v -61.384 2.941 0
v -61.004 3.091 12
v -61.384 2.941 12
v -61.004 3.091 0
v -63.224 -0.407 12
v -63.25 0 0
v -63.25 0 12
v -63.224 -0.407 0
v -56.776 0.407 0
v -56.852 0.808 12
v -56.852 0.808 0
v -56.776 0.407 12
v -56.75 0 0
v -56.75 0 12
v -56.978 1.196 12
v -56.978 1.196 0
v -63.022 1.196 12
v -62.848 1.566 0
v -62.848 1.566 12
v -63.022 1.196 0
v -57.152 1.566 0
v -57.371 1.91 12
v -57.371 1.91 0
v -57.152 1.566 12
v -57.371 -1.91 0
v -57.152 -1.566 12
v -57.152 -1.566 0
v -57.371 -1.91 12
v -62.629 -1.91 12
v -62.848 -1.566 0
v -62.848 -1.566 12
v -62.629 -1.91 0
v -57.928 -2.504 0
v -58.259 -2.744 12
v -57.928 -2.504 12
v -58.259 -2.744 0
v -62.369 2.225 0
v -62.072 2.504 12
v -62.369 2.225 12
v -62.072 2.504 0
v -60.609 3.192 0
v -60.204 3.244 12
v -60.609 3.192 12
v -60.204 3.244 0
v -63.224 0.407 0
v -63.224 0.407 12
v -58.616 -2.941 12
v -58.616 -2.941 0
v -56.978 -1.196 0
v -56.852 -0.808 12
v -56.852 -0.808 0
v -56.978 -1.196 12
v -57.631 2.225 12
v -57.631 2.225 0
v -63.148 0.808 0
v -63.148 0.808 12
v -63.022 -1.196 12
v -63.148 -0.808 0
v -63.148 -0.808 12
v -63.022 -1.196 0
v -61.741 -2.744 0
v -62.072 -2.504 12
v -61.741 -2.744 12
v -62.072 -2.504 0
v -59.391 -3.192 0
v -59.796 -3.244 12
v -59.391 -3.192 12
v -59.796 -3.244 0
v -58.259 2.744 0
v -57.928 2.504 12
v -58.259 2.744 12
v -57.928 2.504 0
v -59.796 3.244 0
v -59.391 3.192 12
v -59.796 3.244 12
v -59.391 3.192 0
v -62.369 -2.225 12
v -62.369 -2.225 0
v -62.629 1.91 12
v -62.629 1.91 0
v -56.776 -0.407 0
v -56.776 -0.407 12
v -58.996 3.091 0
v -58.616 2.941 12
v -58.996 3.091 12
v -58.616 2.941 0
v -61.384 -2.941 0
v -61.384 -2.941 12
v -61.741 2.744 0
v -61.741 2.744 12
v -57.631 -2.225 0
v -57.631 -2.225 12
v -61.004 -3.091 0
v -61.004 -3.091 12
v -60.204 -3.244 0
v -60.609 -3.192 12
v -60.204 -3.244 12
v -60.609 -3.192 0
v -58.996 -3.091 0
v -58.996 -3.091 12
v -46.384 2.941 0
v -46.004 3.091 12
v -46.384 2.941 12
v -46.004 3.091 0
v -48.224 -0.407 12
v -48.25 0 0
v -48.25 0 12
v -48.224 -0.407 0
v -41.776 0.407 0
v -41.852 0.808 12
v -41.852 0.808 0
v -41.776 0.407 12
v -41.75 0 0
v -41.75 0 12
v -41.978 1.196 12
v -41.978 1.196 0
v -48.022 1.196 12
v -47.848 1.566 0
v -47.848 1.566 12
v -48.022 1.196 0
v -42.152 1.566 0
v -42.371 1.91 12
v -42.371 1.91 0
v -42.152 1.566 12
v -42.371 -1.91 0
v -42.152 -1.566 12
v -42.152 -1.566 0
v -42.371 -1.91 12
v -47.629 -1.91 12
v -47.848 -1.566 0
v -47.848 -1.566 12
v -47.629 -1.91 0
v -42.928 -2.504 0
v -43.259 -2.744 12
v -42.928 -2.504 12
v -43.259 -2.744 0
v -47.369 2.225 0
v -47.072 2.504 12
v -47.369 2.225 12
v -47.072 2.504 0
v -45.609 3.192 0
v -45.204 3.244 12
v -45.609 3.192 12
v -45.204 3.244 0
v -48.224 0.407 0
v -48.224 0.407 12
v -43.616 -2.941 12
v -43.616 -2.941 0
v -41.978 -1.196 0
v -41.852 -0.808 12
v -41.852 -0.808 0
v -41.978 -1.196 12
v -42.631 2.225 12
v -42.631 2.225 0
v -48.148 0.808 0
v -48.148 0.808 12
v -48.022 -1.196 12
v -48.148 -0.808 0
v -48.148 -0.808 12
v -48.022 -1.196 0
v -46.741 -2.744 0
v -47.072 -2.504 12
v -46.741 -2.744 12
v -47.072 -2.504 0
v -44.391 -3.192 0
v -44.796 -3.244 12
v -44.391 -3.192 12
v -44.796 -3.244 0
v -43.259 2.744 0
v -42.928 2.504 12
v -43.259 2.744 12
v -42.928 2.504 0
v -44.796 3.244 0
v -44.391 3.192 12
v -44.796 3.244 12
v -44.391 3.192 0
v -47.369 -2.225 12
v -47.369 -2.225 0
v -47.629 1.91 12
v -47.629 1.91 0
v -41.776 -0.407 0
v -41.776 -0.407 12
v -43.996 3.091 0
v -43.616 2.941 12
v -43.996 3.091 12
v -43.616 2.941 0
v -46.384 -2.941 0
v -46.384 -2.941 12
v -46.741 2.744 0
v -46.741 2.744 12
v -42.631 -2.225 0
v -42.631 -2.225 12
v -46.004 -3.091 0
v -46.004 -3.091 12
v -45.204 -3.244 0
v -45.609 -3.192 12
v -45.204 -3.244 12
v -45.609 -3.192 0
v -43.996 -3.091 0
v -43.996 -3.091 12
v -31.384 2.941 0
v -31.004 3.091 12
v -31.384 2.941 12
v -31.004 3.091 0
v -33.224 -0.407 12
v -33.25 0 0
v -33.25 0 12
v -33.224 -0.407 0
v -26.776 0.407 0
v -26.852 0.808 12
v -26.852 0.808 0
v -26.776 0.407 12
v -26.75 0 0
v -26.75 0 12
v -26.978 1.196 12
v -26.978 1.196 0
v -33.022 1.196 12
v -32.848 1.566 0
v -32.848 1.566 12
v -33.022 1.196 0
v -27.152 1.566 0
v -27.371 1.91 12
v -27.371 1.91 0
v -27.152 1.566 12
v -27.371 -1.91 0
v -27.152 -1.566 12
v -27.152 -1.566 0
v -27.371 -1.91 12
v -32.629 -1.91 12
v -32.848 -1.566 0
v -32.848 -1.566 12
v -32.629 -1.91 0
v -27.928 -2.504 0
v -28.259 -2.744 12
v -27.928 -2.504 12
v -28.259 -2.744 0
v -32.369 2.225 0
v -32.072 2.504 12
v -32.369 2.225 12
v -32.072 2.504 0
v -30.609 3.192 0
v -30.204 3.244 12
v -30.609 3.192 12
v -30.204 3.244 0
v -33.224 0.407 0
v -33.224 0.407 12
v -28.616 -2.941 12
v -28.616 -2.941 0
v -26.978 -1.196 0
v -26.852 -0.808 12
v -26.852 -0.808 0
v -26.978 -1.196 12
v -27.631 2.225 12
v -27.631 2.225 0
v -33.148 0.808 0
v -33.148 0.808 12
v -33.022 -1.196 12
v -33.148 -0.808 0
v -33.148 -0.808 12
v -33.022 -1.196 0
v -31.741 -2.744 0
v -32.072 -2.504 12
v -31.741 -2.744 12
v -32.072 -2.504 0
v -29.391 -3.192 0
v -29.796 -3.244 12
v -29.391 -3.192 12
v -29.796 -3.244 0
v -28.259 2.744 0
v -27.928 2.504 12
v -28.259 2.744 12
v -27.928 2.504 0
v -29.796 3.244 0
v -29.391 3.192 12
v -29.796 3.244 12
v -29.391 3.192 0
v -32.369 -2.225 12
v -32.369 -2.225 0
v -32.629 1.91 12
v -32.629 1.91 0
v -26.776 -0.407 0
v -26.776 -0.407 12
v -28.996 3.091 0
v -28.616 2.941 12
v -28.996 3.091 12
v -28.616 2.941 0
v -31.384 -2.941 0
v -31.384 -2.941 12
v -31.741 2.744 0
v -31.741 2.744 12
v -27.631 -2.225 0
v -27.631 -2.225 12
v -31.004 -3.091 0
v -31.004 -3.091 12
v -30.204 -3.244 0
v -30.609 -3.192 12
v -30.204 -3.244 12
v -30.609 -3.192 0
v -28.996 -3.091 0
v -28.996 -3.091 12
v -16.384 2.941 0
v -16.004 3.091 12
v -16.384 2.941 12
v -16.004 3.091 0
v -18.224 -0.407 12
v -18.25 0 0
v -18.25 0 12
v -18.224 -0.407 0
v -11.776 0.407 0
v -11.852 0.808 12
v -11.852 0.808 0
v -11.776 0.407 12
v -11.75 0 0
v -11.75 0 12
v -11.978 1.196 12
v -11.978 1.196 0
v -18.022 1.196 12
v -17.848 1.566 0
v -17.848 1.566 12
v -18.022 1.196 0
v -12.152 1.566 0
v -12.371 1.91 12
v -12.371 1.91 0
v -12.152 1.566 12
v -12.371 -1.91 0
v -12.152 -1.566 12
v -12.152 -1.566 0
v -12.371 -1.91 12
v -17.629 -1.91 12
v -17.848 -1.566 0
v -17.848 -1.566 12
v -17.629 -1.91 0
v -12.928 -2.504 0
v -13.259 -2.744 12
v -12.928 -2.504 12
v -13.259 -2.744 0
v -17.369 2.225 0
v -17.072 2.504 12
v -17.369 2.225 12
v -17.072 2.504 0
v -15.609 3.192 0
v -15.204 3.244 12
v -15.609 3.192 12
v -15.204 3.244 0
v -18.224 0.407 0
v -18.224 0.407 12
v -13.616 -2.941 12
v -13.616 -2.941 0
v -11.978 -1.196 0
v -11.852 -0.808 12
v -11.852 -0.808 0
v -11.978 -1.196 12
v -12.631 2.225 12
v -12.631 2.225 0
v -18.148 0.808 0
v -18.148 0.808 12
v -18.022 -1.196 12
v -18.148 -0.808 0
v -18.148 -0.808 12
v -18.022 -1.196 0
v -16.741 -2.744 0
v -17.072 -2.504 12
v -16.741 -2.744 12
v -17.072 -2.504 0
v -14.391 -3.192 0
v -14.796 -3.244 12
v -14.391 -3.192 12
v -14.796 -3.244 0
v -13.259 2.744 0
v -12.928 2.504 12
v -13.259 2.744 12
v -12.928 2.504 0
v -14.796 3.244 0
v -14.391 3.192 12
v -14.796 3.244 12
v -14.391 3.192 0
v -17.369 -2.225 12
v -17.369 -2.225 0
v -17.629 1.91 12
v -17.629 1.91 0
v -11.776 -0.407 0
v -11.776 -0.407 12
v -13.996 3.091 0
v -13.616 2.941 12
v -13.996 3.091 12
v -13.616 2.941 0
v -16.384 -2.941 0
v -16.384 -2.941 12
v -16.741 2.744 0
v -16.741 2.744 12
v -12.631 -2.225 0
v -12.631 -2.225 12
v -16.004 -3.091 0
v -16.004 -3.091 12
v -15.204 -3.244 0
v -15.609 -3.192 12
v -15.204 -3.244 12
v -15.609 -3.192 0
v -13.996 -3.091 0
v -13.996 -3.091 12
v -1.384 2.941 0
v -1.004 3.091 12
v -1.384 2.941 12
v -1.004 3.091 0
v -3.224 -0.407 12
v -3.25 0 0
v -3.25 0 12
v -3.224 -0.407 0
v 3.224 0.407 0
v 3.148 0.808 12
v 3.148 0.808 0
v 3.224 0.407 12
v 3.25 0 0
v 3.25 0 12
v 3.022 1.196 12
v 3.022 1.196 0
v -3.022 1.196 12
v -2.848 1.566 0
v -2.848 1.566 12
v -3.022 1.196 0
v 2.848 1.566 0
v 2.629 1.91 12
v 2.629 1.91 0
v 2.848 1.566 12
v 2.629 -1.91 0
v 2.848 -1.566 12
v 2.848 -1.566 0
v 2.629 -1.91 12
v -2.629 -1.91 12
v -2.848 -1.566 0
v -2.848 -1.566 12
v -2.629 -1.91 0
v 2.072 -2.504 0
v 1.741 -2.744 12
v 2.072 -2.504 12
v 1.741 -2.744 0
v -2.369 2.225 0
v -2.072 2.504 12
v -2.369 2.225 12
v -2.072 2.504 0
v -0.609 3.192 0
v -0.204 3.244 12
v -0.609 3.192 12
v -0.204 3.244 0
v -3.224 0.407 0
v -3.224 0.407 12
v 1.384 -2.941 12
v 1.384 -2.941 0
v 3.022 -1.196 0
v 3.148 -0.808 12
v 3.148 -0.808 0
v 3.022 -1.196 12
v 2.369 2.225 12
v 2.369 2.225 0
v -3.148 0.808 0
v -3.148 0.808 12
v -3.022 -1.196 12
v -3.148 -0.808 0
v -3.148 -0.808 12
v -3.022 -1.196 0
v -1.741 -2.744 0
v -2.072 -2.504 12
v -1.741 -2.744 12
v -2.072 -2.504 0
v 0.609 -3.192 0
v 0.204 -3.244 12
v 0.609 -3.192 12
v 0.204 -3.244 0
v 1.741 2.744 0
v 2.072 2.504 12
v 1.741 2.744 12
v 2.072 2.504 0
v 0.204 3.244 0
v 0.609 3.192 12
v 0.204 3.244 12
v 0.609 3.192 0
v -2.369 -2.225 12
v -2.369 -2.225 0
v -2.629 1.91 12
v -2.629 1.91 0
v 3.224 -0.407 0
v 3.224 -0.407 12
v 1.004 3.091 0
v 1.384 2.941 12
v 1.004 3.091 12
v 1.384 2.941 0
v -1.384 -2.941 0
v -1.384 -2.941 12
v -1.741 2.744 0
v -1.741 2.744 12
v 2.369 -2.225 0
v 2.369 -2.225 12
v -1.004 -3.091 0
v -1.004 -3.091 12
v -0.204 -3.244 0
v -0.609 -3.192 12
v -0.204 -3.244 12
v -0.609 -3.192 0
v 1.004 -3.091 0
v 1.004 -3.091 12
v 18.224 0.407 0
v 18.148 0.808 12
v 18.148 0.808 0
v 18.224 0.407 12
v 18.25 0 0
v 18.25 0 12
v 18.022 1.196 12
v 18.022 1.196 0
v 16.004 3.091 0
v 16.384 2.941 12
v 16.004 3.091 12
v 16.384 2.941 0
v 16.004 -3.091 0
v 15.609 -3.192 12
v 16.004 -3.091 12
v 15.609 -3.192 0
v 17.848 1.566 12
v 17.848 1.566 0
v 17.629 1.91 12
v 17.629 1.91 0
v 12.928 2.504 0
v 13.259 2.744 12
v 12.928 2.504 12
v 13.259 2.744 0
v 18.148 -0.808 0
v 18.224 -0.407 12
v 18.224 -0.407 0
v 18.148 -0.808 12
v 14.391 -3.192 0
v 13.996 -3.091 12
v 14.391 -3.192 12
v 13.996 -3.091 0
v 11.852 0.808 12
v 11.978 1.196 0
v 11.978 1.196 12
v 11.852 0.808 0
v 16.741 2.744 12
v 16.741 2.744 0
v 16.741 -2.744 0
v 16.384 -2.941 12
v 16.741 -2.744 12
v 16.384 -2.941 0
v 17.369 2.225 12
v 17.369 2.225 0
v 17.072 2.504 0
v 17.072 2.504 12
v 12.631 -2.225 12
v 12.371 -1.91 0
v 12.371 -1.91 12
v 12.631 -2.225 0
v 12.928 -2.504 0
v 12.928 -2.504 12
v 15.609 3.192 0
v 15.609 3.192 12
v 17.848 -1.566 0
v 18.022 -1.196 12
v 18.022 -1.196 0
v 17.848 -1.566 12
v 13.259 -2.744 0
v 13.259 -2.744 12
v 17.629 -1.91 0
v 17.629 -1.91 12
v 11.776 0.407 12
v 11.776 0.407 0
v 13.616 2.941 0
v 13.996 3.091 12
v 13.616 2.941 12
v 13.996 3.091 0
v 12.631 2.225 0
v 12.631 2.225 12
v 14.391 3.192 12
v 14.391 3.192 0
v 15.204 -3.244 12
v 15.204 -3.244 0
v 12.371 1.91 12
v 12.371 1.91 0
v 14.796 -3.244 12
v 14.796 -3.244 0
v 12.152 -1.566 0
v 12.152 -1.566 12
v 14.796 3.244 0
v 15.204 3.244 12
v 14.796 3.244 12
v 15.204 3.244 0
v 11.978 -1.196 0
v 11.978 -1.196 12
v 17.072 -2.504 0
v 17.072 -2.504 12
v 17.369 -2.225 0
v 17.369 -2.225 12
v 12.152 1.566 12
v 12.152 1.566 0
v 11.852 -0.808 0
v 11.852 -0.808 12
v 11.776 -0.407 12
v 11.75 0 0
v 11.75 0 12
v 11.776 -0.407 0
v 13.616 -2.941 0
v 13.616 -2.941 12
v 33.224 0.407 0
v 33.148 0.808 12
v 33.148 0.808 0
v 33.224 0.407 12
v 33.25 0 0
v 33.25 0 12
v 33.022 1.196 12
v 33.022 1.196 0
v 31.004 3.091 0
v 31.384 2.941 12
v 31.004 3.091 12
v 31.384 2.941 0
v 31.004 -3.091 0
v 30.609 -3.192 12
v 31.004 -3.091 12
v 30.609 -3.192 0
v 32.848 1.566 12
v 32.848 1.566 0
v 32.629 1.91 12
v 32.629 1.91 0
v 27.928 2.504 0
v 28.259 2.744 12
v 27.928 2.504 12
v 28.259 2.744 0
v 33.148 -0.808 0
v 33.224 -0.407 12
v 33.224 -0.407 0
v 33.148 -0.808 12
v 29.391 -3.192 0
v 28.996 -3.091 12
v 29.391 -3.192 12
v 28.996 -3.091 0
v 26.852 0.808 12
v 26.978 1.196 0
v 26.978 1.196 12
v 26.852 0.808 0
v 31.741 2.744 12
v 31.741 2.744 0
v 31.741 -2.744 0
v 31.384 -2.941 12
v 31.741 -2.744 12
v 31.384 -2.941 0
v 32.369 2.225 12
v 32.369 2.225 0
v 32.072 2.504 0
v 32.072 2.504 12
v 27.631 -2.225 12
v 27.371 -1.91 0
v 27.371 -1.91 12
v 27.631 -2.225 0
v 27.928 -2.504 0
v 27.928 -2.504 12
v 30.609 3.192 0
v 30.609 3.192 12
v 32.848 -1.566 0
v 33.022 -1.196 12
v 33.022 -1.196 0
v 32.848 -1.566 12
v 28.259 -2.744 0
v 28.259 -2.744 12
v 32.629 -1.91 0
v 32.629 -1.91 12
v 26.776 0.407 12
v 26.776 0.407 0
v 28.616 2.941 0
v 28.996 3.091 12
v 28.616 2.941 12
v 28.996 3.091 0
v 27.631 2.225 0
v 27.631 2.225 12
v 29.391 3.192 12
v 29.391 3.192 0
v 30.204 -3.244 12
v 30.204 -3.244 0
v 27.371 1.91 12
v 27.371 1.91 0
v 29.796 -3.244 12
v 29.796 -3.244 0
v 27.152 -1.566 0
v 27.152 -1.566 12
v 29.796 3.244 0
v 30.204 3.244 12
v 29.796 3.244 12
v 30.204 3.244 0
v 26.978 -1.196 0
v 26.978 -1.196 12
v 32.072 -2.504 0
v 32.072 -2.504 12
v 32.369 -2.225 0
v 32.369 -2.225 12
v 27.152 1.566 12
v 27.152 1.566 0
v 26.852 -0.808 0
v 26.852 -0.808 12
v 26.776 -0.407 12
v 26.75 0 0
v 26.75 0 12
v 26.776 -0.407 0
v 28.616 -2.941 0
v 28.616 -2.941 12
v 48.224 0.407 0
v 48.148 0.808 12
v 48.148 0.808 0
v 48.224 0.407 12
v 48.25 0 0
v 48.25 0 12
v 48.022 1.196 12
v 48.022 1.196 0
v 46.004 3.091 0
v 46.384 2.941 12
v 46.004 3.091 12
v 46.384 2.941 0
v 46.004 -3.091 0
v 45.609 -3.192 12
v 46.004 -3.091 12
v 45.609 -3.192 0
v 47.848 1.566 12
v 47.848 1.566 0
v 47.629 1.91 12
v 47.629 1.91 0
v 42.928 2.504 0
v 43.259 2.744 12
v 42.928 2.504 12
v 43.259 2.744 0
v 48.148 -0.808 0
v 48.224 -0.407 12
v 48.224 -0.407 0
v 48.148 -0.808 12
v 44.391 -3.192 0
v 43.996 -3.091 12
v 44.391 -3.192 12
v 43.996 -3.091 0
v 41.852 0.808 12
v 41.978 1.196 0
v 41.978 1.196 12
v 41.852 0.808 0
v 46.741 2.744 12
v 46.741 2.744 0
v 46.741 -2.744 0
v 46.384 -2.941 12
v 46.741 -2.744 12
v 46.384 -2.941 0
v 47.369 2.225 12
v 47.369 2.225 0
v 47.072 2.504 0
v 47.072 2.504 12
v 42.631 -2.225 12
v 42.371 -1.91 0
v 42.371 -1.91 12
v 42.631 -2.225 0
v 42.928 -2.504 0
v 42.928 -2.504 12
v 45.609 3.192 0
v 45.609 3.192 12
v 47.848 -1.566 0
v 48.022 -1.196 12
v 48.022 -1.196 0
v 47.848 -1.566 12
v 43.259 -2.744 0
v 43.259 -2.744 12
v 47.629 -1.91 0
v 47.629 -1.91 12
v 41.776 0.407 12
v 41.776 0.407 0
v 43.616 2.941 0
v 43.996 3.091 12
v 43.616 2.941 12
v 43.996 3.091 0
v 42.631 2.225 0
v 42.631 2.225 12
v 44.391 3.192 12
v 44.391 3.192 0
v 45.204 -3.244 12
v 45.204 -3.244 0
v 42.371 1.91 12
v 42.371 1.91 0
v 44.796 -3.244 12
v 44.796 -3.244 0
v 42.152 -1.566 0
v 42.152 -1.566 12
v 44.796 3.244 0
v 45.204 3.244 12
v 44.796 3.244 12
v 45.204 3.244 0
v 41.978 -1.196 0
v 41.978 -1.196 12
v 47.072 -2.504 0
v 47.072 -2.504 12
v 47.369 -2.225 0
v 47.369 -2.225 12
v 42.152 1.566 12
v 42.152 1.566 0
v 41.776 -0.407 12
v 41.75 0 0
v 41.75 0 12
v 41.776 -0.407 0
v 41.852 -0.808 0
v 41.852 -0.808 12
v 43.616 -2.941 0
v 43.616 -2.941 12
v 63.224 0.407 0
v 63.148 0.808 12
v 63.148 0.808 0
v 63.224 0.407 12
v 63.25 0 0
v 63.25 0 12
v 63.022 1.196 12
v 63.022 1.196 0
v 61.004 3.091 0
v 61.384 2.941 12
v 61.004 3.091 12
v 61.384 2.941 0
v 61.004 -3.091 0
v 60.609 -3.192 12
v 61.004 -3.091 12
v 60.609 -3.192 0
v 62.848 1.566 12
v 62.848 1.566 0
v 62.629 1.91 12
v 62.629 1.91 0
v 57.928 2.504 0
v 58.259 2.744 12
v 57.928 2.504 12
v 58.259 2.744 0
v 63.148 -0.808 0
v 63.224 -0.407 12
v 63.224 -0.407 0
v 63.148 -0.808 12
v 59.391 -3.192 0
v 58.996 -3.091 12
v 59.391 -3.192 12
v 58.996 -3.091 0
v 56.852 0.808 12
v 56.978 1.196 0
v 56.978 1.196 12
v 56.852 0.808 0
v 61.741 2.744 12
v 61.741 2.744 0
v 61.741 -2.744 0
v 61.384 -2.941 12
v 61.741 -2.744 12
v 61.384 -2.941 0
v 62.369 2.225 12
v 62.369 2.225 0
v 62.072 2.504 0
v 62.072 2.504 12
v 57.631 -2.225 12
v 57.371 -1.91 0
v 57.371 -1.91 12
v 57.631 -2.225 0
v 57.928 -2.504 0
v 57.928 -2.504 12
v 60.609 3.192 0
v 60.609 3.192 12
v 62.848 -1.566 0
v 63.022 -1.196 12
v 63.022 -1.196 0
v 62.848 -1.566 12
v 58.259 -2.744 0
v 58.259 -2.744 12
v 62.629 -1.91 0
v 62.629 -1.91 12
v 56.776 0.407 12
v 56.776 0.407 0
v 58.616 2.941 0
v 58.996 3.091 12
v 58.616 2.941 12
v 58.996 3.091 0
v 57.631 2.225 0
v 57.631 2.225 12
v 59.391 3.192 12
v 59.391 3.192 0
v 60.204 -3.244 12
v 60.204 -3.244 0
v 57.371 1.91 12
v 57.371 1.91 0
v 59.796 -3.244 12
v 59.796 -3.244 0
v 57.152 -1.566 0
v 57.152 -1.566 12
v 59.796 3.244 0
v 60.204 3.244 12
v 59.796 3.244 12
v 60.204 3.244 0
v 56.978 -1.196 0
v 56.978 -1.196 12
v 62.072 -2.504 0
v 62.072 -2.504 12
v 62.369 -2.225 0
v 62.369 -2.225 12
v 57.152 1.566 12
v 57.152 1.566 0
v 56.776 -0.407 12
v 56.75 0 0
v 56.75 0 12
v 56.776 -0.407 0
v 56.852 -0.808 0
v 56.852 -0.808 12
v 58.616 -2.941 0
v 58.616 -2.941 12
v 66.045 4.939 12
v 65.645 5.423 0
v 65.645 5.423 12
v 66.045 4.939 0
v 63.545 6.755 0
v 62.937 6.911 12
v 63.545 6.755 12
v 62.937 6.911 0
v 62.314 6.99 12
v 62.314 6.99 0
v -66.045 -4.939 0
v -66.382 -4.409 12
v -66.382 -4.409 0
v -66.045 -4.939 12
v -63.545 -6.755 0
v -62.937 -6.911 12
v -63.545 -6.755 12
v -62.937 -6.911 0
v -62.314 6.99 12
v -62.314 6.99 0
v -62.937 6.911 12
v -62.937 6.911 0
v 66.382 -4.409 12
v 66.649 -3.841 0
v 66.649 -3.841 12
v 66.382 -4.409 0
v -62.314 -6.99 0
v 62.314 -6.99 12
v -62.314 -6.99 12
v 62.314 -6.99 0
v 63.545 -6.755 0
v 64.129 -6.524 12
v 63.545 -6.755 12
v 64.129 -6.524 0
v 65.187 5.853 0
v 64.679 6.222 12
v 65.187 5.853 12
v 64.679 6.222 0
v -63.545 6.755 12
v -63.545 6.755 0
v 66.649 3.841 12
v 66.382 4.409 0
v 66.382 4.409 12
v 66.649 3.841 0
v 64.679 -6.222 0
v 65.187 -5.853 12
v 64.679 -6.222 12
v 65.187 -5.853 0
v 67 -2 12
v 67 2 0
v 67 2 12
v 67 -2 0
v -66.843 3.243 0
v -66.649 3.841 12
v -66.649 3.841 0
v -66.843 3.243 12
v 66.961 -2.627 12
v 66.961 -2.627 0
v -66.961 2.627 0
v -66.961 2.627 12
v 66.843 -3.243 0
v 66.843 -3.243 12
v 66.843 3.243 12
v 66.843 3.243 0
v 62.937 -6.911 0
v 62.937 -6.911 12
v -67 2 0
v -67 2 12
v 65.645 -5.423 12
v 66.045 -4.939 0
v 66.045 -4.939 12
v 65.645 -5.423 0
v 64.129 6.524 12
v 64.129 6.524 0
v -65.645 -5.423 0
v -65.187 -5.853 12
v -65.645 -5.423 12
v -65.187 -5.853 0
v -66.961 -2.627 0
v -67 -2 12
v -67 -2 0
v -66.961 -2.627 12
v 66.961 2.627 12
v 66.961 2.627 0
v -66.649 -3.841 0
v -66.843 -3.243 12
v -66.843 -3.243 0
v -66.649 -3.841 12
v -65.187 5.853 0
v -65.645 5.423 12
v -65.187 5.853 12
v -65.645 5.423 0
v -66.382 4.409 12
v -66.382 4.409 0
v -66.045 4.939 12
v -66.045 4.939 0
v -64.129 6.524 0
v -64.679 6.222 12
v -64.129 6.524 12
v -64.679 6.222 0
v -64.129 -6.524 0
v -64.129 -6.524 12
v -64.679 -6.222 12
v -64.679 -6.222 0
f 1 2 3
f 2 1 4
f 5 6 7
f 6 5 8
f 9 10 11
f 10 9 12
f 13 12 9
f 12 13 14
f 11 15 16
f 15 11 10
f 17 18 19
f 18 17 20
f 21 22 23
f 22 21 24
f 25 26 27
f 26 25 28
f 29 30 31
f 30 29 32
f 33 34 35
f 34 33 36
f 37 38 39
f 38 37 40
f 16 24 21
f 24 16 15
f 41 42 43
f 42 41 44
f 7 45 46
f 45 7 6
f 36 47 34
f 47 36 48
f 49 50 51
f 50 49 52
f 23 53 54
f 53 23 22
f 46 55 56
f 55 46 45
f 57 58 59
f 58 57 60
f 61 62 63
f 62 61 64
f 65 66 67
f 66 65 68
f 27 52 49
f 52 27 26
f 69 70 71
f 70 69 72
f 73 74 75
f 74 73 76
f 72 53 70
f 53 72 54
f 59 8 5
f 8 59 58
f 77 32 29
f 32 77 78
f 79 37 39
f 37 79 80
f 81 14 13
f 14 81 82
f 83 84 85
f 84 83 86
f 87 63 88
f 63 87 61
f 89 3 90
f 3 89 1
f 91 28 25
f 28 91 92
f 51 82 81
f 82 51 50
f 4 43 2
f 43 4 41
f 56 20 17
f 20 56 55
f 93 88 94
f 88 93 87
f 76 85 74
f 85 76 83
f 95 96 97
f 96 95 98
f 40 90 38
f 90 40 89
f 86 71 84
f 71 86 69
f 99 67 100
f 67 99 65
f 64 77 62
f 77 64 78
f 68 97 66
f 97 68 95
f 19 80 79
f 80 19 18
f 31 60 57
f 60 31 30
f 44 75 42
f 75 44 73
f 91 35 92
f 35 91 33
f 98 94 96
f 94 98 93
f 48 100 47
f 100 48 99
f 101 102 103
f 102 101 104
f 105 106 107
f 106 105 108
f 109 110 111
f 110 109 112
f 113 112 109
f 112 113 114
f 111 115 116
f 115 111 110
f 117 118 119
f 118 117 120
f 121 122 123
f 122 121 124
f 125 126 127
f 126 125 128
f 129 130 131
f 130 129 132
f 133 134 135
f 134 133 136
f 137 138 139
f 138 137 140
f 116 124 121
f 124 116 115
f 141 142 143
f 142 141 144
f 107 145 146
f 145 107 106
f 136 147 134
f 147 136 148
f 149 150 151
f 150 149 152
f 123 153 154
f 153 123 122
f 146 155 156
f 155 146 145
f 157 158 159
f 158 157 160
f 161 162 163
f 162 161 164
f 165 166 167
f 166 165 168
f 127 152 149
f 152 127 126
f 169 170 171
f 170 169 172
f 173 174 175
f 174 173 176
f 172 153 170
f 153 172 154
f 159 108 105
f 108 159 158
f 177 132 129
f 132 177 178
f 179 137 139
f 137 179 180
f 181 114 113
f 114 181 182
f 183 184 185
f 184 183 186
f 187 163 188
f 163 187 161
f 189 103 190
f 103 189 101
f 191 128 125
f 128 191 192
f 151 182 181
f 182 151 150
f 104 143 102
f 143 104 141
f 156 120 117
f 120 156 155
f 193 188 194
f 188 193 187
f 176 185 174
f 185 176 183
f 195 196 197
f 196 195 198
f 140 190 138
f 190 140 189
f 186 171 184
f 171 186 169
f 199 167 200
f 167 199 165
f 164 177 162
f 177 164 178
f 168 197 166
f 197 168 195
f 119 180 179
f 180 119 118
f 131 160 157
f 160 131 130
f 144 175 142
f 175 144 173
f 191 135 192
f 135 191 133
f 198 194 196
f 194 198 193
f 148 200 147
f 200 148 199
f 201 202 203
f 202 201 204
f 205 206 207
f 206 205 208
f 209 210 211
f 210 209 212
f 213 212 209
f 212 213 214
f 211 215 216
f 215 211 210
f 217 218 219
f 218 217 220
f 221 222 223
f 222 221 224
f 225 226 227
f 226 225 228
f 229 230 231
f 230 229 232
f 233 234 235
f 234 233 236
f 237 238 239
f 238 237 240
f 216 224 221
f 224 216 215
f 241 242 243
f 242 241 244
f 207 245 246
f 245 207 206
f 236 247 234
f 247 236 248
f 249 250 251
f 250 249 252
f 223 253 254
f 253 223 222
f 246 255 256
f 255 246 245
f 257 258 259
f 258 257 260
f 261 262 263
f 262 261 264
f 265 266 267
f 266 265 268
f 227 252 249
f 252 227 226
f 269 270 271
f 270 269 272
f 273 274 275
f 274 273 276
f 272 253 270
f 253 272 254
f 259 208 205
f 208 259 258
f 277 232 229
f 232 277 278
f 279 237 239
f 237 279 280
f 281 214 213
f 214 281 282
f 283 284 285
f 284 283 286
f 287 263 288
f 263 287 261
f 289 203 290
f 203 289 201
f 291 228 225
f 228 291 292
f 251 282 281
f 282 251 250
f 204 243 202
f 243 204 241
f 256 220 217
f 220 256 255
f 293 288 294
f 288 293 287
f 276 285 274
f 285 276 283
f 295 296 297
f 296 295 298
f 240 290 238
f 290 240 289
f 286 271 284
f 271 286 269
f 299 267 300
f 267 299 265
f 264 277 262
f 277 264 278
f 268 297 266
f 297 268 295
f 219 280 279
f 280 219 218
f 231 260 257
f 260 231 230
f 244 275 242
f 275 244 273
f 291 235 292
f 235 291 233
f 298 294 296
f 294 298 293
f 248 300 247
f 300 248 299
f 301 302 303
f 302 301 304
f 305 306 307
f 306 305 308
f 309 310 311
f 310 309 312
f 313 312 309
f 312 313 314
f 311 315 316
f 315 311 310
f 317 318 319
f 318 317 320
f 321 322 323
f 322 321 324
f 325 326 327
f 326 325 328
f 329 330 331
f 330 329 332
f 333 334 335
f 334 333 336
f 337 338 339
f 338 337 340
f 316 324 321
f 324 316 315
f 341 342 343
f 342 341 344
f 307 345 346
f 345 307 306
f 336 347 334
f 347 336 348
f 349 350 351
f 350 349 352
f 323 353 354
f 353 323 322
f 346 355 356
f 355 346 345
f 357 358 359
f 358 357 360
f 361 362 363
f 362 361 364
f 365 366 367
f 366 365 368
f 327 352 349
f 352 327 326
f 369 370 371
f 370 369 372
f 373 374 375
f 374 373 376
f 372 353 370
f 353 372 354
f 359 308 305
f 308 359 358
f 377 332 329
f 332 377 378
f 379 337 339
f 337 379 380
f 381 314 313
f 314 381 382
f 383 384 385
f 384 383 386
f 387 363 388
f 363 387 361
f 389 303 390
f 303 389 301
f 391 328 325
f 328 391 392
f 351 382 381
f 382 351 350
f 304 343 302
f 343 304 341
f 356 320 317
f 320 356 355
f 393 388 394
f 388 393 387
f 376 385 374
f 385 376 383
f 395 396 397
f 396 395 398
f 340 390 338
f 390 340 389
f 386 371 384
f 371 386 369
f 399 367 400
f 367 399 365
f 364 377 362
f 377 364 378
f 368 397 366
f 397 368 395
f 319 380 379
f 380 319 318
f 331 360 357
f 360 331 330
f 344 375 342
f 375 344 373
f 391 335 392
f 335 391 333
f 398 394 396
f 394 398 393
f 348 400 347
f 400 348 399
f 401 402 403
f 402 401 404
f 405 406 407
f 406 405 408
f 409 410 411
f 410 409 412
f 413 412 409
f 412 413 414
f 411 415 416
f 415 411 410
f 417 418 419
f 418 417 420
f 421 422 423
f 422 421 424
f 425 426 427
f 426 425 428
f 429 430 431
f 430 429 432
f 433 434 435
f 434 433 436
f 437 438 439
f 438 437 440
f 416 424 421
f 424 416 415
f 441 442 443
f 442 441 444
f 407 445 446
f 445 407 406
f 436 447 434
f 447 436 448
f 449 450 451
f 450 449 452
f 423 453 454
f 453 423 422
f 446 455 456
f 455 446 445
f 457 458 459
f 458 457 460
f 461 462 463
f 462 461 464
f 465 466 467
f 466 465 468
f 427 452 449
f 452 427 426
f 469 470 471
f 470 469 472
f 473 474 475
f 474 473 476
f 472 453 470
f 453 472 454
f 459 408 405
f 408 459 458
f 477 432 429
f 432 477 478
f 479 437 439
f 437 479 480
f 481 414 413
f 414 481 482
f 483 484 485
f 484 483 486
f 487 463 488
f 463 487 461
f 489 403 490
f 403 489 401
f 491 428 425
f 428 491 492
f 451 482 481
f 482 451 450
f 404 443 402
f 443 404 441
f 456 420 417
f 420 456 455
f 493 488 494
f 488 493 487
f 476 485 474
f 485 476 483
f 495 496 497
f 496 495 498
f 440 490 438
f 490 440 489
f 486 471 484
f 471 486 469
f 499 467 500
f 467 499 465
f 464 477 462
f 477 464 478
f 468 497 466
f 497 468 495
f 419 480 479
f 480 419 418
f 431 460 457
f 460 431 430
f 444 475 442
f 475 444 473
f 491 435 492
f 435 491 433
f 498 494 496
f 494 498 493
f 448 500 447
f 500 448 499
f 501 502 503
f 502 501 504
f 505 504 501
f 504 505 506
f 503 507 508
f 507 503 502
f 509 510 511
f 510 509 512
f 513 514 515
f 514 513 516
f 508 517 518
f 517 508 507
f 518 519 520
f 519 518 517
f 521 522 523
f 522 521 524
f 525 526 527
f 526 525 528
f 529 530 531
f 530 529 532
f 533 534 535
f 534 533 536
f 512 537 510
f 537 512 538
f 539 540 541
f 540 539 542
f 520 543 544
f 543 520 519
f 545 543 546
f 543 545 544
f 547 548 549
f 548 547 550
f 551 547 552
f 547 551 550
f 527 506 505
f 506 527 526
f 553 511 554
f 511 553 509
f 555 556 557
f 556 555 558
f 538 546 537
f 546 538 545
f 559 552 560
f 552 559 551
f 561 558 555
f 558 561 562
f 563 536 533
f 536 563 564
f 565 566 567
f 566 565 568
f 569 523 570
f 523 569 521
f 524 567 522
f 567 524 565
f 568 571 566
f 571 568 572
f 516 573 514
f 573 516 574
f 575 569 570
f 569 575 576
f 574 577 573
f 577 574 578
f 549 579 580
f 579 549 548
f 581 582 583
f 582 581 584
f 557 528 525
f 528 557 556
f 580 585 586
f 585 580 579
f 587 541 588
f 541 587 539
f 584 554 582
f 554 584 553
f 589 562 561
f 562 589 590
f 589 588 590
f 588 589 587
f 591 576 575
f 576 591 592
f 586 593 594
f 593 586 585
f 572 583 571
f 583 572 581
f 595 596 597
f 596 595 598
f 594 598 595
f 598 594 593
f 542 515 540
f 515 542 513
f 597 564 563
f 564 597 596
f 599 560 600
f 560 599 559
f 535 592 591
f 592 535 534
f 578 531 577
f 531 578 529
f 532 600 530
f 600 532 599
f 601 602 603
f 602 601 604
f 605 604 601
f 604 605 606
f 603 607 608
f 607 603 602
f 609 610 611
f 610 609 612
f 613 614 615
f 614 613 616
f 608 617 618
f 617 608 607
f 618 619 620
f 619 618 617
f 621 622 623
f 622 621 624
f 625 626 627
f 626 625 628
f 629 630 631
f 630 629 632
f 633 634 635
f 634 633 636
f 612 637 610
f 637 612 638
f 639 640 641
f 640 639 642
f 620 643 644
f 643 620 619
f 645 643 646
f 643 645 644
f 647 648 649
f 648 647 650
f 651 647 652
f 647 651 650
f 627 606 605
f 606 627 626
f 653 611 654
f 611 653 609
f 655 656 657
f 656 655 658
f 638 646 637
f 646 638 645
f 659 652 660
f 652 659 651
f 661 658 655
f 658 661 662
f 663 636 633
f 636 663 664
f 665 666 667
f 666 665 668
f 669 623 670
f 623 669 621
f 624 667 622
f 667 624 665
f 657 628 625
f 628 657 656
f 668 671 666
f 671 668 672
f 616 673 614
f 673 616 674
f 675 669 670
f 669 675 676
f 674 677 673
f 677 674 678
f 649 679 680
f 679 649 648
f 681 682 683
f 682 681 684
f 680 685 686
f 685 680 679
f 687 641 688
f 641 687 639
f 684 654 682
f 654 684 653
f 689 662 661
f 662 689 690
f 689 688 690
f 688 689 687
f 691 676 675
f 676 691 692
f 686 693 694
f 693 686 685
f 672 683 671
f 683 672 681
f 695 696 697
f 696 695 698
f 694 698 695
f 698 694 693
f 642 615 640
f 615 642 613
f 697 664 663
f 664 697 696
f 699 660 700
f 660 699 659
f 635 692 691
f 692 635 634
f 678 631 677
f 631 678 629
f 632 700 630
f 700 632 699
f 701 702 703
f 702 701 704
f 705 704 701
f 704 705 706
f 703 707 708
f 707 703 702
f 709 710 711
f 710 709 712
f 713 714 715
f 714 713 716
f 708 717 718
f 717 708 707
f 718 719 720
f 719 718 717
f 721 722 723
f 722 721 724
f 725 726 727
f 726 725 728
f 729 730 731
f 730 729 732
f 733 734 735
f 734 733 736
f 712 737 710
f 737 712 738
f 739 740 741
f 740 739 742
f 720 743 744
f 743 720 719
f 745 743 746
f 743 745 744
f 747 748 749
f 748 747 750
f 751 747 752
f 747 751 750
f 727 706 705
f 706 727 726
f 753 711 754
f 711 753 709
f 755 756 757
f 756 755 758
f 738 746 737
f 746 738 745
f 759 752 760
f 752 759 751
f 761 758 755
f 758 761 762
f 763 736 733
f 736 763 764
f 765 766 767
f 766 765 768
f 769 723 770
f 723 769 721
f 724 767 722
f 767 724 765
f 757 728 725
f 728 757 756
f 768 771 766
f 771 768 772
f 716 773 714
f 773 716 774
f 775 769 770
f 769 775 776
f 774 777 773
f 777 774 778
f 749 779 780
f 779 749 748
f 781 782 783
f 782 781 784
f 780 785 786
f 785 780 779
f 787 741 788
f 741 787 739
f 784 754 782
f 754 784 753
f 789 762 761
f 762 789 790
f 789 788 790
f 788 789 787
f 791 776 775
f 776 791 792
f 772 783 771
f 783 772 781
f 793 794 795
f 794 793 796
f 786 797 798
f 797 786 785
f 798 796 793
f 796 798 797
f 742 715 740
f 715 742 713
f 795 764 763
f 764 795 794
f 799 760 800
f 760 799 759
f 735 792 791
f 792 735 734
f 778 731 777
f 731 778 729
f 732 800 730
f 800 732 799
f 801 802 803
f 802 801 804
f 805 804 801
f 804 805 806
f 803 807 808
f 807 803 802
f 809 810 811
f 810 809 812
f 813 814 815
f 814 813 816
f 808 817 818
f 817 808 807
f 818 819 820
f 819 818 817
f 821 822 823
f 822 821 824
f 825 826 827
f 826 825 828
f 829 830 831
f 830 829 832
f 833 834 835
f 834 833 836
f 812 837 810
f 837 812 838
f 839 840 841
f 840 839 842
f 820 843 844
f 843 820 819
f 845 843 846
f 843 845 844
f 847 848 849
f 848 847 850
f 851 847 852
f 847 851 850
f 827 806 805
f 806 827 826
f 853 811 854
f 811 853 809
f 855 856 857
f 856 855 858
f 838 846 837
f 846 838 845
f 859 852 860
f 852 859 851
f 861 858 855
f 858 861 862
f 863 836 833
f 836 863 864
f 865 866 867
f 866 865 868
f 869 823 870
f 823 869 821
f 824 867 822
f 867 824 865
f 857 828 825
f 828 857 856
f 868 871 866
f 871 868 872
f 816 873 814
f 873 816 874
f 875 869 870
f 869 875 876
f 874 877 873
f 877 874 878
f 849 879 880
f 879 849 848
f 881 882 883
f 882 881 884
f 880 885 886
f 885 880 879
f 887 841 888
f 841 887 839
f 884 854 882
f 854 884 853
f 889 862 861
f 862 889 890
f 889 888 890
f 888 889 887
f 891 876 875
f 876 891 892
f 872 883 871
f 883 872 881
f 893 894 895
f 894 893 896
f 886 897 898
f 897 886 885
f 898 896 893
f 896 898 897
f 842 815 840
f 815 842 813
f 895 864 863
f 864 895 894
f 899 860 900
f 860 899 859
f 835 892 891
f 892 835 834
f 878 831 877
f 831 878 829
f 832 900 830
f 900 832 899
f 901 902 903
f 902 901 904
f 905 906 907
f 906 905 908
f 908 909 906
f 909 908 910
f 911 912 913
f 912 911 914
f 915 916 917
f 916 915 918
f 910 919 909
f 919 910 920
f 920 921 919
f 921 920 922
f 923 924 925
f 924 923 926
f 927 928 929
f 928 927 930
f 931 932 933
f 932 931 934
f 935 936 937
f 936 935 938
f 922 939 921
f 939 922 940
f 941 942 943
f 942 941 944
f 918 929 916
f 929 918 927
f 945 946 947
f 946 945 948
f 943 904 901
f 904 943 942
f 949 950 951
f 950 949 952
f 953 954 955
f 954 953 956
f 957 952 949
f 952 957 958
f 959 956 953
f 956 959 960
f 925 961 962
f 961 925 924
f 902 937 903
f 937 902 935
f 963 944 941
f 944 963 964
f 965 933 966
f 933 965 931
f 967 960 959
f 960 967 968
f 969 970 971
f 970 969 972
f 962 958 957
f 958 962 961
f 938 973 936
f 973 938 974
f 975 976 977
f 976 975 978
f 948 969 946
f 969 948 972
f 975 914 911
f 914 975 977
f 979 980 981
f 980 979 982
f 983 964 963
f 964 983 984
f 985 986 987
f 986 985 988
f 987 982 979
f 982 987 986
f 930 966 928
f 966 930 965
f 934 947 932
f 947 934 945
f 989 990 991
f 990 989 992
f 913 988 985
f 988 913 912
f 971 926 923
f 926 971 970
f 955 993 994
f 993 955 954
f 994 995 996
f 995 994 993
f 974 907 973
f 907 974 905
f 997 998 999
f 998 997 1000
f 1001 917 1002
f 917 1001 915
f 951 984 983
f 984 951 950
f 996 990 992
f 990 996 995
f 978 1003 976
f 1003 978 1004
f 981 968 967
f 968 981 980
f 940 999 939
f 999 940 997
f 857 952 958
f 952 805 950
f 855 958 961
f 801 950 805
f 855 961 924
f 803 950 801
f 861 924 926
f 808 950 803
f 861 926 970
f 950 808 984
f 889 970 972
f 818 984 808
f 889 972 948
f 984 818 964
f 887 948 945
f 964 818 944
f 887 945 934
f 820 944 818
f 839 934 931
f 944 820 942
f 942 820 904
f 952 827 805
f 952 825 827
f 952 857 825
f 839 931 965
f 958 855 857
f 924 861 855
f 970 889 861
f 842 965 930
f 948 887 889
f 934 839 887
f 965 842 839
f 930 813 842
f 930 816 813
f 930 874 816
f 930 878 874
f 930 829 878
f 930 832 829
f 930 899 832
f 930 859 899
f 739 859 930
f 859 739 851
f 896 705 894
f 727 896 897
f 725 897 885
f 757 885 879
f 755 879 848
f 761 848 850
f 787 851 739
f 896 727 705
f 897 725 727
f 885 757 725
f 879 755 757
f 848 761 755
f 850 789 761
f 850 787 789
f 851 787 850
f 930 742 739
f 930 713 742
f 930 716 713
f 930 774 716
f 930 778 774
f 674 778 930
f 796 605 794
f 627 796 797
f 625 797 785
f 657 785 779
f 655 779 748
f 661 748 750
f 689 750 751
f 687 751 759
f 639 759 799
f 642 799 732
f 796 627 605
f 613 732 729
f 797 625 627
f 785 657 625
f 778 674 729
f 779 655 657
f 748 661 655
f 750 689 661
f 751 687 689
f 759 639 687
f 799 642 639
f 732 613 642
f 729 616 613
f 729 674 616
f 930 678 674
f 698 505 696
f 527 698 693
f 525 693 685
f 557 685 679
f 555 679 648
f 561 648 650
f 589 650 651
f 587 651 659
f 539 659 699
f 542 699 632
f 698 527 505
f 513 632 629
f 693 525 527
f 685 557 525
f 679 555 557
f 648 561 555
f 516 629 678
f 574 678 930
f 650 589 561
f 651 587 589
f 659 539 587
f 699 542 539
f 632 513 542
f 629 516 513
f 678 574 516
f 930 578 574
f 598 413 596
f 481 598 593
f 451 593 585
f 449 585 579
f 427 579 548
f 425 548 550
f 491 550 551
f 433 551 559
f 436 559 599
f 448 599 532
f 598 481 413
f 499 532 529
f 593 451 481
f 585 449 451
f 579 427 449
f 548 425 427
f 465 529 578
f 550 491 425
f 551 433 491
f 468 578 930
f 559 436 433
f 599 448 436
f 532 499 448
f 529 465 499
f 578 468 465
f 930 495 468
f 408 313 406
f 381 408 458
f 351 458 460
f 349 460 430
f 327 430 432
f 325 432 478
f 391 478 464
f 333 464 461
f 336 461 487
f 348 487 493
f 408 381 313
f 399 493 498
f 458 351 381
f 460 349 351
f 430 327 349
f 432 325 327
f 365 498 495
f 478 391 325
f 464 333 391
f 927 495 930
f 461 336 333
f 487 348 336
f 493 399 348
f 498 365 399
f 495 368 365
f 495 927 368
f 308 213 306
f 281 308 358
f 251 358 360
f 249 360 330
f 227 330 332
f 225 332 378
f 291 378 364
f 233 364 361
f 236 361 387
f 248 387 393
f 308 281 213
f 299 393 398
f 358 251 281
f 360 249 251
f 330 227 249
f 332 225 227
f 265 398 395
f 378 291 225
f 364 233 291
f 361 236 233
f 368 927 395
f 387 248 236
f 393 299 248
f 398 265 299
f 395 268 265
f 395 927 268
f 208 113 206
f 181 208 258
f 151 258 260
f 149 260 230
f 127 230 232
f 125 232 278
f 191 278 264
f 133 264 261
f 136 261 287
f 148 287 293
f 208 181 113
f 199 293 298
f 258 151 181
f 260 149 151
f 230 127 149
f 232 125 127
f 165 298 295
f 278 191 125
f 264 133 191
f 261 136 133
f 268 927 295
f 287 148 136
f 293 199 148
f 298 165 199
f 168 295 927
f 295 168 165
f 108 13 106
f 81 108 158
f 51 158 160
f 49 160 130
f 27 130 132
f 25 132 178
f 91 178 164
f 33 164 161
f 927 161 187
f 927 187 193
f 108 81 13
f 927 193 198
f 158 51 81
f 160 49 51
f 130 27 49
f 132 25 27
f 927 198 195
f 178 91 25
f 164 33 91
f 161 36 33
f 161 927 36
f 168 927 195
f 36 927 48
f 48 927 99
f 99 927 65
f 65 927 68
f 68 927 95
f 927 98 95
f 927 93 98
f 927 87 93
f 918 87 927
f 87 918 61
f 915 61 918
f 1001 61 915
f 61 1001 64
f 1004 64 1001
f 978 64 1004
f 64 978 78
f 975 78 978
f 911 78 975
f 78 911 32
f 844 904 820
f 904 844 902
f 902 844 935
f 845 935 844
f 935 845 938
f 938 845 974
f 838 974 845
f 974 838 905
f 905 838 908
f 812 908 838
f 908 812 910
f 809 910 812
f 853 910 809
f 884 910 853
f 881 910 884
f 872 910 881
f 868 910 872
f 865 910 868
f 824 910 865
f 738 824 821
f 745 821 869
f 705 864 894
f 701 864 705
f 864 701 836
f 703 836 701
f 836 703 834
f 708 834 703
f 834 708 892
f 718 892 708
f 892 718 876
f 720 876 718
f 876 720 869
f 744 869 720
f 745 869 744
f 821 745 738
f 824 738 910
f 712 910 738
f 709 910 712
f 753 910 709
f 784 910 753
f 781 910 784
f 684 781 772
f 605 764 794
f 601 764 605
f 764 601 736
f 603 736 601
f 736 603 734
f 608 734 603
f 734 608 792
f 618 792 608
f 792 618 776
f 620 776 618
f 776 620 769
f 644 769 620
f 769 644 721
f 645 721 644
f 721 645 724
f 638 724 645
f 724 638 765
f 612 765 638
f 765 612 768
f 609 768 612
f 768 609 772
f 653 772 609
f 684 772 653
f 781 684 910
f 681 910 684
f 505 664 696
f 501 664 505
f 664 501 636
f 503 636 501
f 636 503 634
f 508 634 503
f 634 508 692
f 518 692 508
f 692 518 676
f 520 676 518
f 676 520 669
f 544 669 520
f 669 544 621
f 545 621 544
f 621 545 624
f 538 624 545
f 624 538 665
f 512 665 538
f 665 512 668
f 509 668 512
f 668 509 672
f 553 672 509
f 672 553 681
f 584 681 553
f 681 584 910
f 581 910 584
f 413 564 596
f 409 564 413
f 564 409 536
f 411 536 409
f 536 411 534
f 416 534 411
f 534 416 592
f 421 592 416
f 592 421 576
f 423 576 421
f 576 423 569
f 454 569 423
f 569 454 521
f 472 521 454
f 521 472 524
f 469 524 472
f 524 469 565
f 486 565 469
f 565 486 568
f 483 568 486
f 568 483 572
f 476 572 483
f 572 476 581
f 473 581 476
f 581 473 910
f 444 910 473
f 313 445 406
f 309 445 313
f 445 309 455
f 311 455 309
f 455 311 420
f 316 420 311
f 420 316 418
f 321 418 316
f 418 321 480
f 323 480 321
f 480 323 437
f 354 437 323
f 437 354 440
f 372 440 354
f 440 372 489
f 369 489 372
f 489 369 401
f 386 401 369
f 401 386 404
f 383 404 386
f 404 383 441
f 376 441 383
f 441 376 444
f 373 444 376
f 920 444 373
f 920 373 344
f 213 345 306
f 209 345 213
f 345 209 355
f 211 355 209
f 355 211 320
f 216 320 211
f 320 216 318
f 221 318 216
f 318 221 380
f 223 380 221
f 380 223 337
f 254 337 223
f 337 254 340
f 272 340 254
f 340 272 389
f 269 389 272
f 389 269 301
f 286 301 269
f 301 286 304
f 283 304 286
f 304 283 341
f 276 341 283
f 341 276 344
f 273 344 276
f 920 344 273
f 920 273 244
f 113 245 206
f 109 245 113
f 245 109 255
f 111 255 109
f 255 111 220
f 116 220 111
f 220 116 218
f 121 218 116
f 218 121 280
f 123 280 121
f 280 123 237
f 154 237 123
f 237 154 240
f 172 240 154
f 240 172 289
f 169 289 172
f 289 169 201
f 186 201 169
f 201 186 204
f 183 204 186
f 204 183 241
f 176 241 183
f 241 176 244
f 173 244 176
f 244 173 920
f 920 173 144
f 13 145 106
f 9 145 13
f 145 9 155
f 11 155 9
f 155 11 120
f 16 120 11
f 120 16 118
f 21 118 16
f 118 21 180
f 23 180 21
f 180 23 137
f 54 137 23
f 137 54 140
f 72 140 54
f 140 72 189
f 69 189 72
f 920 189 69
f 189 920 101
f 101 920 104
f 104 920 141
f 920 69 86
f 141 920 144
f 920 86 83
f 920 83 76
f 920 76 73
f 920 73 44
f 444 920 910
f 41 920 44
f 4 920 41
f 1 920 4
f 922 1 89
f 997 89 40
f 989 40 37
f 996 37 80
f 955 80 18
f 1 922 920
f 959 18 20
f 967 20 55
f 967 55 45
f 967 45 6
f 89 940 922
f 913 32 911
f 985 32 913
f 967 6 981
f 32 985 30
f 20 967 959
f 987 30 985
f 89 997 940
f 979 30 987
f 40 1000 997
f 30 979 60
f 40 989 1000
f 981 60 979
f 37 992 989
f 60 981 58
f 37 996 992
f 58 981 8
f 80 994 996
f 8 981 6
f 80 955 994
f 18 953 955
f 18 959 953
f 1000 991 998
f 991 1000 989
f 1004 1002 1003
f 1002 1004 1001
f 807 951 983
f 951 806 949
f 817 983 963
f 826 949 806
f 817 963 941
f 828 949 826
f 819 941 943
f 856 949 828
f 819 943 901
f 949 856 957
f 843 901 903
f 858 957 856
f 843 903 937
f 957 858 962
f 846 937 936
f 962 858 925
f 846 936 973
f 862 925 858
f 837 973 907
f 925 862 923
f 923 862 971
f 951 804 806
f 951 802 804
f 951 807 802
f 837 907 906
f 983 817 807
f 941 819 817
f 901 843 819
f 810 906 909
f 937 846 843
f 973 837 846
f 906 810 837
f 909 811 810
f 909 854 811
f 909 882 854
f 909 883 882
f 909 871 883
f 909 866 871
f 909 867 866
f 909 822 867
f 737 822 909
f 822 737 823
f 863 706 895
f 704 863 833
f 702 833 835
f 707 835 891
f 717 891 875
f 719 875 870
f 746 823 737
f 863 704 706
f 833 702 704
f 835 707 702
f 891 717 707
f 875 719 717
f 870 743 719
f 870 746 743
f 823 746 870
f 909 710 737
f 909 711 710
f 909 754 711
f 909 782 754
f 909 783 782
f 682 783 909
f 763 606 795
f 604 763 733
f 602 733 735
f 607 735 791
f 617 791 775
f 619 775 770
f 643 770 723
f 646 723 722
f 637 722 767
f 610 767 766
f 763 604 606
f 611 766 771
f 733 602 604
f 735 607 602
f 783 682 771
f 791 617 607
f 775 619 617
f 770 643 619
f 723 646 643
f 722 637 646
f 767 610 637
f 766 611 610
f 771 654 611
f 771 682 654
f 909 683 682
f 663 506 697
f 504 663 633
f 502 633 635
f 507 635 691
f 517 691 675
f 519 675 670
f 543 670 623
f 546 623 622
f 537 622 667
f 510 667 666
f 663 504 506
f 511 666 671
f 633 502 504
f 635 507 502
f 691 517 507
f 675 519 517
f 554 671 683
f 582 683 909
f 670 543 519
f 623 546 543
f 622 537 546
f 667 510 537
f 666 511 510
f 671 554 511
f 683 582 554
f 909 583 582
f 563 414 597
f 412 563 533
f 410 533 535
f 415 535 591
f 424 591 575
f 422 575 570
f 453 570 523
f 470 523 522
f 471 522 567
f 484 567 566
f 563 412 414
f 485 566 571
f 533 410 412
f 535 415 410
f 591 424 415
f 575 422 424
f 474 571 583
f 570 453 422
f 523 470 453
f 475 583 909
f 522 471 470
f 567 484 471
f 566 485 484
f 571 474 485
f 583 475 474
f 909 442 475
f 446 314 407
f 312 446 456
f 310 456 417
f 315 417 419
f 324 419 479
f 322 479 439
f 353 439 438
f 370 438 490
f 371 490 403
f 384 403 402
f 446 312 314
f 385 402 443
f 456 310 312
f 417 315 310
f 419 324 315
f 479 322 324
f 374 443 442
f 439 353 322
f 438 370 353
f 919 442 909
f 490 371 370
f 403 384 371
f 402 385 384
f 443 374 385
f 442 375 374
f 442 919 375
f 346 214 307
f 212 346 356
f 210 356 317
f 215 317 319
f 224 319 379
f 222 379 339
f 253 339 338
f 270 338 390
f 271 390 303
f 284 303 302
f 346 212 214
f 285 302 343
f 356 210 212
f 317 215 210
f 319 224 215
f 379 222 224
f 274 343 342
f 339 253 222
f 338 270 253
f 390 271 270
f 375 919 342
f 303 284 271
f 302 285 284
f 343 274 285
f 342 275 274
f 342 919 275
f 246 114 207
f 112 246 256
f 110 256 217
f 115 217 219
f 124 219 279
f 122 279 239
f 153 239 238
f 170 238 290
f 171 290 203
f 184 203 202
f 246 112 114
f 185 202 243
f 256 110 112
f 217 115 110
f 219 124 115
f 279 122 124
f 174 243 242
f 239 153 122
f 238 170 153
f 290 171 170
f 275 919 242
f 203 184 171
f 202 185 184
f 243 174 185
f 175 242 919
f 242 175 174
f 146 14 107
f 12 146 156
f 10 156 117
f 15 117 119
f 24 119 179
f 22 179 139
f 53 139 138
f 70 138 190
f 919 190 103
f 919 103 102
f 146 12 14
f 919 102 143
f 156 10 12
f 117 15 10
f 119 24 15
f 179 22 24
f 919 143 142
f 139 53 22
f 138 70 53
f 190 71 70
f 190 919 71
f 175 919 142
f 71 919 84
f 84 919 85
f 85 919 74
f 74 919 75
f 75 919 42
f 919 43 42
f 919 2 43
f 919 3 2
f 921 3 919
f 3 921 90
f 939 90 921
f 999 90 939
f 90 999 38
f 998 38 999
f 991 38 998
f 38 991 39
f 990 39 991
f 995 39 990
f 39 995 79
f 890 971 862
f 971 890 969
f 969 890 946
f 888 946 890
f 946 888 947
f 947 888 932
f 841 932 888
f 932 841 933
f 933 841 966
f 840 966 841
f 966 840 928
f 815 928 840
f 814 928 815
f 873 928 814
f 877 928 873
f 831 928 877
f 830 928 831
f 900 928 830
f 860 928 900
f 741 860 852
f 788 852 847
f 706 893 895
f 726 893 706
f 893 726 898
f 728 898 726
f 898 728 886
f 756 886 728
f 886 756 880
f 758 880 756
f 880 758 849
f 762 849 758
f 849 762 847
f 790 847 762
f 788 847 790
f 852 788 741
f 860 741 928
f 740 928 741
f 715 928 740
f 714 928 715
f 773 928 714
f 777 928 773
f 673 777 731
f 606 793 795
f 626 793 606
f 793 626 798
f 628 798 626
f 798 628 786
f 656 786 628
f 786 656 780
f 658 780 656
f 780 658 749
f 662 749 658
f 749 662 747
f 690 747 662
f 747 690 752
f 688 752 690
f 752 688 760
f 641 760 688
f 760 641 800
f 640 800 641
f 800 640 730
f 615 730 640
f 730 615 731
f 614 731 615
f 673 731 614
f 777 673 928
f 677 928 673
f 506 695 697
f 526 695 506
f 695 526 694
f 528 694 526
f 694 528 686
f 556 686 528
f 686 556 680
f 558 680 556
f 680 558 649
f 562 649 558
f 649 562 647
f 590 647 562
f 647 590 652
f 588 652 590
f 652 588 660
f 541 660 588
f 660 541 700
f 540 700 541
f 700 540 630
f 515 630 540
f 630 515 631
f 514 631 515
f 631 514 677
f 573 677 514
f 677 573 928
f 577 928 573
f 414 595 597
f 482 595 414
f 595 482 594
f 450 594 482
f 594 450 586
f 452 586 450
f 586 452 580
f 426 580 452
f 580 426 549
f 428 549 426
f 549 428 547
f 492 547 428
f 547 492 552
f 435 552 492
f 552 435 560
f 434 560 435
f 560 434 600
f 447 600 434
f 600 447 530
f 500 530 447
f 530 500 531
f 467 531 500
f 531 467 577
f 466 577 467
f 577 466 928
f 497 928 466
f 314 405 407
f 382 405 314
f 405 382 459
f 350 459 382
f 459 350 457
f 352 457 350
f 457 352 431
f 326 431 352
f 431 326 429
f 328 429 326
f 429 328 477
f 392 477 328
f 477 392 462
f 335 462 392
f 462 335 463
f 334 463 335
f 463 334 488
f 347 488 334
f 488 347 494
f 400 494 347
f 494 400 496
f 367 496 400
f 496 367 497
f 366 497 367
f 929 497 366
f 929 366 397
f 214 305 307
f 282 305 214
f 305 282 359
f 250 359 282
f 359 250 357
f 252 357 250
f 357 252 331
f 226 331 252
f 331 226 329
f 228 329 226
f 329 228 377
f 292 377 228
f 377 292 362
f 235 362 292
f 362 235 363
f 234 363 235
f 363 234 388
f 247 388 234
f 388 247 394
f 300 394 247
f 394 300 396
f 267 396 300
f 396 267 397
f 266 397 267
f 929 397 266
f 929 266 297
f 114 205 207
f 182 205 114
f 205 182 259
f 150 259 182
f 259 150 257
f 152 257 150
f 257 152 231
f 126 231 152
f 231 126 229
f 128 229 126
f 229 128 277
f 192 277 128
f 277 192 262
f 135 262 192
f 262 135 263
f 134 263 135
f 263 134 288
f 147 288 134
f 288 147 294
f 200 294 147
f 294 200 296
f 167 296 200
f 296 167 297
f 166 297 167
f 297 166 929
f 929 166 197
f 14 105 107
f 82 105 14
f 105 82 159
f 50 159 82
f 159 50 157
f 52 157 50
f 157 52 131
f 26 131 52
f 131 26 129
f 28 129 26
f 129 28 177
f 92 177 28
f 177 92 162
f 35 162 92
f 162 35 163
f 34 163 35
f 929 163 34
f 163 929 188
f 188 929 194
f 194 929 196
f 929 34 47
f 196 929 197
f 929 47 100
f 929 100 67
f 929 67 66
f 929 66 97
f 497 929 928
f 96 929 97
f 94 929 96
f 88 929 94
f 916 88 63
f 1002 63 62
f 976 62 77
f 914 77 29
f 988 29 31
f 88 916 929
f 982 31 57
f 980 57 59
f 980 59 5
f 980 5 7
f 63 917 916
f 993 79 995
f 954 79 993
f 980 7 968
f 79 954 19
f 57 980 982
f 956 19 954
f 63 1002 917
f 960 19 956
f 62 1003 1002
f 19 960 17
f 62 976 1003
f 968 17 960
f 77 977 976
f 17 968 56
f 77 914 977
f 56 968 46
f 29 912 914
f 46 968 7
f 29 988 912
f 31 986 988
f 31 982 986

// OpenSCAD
$fn = 50;


difference() {
	union() {
		hull() {
			translate(v = [-62.0000000000, 2.0000000000, 0]) {
				cylinder(h = 12, r = 5);
			}
			translate(v = [62.0000000000, 2.0000000000, 0]) {
				cylinder(h = 12, r = 5);
			}
			translate(v = [-62.0000000000, -2.0000000000, 0]) {
				cylinder(h = 12, r = 5);
			}
			translate(v = [62.0000000000, -2.0000000000, 0]) {
				cylinder(h = 12, r = 5);
			}
		}
	}
	union() {
		translate(v = [-60.0000000000, 0.0000000000, -100.0000000000]) {
			cylinder(h = 200, r = 3.2500000000);
		}
		translate(v = [-45.0000000000, 0.0000000000, -100.0000000000]) {
			cylinder(h = 200, r = 3.2500000000);
		}
		translate(v = [-30.0000000000, 0.0000000000, -100.0000000000]) {
			cylinder(h = 200, r = 3.2500000000);
		}
		translate(v = [-15.0000000000, 0.0000000000, -100.0000000000]) {
			cylinder(h = 200, r = 3.2500000000);
		}
		translate(v = [0.0000000000, 0.0000000000, -100.0000000000]) {
			cylinder(h = 200, r = 3.2500000000);
		}
		translate(v = [15.0000000000, 0.0000000000, -100.0000000000]) {
			cylinder(h = 200, r = 3.2500000000);
		}
		translate(v = [30.0000000000, 0.0000000000, -100.0000000000]) {
			cylinder(h = 200, r = 3.2500000000);
		}
		translate(v = [45.0000000000, 0.0000000000, -100.0000000000]) {
			cylinder(h = 200, r = 3.2500000000);
		}
		translate(v = [60.0000000000, 0.0000000000, -100.0000000000]) {
			cylinder(h = 200, r = 3.2500000000);
		}
	}
}
